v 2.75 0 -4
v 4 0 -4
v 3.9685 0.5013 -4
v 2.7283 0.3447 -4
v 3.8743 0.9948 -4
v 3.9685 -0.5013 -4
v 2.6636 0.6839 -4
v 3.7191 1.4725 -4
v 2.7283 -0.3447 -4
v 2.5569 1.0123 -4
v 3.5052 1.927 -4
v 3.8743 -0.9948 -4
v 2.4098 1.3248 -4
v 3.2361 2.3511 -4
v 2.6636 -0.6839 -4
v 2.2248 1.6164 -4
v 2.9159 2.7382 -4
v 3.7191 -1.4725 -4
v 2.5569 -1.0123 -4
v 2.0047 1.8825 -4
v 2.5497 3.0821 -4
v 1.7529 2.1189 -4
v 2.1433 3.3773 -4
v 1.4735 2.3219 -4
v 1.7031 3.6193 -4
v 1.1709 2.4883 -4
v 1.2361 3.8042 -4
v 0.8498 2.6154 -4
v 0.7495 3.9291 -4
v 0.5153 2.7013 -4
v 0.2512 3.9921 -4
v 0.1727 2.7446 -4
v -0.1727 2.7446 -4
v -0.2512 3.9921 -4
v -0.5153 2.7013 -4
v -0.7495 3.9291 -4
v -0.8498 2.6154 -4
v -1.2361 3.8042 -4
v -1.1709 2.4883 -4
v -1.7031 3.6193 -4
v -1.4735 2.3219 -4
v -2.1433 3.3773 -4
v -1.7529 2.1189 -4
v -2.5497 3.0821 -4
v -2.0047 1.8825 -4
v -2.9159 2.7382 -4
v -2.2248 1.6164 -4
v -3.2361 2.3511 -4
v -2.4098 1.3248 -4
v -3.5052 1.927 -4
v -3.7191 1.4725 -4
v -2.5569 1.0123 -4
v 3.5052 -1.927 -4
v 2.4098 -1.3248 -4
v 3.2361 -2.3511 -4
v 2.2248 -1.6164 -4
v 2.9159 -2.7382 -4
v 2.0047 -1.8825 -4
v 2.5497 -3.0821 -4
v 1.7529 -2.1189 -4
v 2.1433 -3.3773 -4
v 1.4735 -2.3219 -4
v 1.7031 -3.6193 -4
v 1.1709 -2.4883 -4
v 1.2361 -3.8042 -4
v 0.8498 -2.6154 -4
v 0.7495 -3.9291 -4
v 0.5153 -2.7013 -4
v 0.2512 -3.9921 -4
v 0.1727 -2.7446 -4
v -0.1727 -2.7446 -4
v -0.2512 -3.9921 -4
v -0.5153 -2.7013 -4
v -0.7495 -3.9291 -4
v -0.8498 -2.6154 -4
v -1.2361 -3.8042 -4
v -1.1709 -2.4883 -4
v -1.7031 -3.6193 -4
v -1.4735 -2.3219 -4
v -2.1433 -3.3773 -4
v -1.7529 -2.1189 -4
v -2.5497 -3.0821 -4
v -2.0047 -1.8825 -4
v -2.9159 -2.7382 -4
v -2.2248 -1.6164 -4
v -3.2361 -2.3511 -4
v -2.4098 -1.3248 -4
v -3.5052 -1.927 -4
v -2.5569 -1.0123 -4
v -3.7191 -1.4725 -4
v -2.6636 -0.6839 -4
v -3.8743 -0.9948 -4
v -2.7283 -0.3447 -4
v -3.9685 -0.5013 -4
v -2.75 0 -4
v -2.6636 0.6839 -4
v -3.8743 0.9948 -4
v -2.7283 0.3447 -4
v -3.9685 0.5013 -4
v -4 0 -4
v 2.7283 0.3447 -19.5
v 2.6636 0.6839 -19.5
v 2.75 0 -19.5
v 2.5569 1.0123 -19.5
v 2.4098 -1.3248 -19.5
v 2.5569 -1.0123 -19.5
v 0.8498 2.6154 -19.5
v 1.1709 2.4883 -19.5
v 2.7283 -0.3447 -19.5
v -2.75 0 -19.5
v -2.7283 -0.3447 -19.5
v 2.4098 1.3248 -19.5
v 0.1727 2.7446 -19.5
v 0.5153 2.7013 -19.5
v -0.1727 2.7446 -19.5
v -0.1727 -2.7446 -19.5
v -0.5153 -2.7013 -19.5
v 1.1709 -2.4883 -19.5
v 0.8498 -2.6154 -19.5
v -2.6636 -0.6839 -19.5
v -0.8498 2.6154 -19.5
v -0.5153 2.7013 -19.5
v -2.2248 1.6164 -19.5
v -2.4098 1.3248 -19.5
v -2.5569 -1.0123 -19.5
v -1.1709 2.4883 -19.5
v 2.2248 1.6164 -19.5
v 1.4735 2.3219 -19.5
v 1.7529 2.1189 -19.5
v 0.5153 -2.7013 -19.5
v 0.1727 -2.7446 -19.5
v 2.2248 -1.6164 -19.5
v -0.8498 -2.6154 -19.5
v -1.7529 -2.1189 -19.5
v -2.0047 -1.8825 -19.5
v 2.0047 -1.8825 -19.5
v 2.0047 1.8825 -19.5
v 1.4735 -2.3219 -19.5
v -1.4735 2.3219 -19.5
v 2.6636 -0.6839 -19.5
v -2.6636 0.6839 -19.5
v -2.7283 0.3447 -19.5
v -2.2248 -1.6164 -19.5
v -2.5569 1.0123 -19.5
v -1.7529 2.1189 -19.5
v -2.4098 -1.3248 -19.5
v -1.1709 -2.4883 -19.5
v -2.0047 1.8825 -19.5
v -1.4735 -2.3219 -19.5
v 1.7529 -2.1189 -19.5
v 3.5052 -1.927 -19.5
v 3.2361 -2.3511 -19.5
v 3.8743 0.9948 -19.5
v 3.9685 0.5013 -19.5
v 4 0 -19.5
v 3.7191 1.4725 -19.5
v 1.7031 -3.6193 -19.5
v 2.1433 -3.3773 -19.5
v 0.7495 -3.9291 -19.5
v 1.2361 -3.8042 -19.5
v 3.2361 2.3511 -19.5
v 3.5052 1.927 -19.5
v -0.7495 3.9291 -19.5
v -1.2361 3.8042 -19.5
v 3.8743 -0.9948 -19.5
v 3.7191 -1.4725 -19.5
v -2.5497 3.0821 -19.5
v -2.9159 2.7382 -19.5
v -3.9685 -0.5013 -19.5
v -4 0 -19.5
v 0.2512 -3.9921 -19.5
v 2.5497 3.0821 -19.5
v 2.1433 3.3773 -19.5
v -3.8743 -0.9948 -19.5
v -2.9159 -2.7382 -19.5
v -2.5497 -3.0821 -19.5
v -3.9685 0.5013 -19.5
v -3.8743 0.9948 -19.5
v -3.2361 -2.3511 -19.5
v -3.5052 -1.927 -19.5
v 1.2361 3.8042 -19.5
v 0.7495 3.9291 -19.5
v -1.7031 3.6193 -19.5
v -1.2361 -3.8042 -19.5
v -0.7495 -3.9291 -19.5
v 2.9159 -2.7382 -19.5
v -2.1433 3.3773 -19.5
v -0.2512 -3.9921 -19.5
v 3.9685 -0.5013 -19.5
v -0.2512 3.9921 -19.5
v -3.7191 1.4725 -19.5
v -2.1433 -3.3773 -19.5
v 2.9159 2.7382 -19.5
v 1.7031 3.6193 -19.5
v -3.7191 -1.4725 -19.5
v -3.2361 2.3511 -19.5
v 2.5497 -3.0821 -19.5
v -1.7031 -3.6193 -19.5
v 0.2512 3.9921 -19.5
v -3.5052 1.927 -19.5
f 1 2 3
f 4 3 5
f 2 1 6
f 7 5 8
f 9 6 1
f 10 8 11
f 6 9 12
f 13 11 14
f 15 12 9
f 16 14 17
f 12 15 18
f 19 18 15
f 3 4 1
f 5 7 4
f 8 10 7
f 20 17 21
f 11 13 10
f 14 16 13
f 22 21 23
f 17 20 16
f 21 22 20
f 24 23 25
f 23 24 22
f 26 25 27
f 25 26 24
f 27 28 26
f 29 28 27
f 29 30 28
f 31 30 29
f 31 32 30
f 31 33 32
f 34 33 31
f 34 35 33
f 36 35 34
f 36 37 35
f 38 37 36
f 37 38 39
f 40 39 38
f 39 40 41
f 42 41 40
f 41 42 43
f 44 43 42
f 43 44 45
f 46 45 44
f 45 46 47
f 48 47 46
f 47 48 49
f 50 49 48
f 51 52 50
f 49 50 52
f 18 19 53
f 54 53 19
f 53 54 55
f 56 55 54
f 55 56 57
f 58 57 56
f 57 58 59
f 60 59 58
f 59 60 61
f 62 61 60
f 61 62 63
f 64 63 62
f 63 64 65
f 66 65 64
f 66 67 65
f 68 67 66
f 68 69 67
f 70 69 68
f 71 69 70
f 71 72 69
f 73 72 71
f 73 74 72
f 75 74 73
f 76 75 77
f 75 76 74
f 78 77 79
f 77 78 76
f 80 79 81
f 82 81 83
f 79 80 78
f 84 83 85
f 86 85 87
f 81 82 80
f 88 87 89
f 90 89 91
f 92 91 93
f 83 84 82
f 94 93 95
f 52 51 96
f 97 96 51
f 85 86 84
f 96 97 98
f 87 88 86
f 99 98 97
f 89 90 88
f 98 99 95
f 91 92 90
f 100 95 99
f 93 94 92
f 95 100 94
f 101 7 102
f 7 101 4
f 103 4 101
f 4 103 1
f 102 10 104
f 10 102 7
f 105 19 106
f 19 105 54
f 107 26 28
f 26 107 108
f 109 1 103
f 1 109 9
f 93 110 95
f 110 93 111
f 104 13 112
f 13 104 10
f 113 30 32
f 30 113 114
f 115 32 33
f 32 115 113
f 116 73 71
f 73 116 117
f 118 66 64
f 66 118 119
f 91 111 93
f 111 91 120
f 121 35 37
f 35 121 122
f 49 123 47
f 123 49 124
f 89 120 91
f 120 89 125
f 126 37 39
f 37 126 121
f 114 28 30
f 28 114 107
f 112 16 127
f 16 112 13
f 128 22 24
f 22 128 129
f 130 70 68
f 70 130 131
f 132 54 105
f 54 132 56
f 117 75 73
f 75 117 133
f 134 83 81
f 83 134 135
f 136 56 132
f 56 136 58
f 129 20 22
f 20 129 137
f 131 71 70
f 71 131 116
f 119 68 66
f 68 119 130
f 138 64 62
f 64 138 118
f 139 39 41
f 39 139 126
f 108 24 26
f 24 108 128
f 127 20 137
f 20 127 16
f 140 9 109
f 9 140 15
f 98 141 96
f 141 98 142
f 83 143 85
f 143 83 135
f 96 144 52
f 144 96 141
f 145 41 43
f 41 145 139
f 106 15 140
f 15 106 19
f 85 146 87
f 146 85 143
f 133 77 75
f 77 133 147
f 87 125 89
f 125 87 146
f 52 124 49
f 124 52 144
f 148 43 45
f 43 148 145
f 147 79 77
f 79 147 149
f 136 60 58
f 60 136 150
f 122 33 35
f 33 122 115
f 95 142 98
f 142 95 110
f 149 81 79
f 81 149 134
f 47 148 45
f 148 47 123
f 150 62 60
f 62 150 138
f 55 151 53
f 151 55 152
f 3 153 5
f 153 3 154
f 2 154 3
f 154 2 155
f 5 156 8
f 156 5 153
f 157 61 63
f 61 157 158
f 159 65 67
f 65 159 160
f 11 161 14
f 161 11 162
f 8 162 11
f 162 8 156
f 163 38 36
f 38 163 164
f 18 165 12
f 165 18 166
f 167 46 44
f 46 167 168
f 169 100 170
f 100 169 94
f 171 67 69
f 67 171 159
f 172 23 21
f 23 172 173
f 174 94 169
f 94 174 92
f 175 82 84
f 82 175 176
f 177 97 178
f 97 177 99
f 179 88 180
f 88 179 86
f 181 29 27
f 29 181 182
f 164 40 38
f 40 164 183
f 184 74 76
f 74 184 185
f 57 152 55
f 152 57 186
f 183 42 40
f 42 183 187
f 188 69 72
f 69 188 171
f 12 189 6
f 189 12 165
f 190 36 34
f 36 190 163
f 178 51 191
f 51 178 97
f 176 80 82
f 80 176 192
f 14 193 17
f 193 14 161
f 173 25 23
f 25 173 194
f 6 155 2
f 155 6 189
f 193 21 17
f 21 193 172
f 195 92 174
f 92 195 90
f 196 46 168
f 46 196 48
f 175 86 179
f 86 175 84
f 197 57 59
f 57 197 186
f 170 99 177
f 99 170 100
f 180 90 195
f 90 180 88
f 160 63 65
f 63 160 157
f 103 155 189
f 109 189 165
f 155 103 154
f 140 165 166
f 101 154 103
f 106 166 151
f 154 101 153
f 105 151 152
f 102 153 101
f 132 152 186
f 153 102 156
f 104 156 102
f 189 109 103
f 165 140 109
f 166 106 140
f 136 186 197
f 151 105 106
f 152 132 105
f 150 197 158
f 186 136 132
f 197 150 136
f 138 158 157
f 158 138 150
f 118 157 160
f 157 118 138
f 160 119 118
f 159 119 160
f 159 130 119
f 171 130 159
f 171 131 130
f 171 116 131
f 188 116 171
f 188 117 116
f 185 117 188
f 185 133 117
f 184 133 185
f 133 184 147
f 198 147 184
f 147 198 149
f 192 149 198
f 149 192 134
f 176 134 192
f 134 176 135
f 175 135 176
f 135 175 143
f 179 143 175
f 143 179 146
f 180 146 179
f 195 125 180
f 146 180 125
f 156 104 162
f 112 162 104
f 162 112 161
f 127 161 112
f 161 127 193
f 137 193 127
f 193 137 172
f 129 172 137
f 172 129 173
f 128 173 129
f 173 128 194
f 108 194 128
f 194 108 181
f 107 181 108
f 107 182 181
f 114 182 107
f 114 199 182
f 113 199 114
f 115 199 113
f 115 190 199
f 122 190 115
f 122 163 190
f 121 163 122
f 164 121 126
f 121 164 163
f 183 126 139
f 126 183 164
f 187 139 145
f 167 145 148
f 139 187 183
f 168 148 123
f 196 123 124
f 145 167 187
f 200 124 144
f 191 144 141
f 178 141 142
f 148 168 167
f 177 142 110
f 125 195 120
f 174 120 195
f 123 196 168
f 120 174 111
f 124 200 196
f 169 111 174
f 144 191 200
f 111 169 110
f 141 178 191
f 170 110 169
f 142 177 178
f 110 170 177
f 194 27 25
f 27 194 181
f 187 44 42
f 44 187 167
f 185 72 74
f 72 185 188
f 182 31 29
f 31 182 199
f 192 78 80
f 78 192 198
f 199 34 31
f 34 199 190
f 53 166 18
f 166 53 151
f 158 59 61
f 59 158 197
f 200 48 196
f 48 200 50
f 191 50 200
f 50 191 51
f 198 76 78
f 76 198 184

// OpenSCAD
$fn = 50;

difference() {
	union() {
		translate(v = [0, 0, -19.5]) {
			cylinder(h = 22.5, r = 4.0);
		}
	}
	union() {
		translate(v = [0, 0, 0]) {
			rotate(a = [0, 0, 0]) {
				difference() {
					union() {
						translate(v = [0, 0, -4]) {
							linear_extrude(height = 4) {
								polygon(points = [[4.8468, 0.0], [2.4234000000000004, 4.197451927062417], [-2.423399999999999, 4.197451927062417], [-4.8468, 5.935618106107392e-16], [-2.423400000000002, -4.197451927062416], [2.423399999999997, -4.197451927062419]]);
							}
						}
					}
					union();
				}
			}
		}
		#cylinder(h = 3, r = 6.25);
		#translate(v = [0, 0, -100.0]) {
			cylinder(h = 200, r = 2.75);
		}
	}
}
